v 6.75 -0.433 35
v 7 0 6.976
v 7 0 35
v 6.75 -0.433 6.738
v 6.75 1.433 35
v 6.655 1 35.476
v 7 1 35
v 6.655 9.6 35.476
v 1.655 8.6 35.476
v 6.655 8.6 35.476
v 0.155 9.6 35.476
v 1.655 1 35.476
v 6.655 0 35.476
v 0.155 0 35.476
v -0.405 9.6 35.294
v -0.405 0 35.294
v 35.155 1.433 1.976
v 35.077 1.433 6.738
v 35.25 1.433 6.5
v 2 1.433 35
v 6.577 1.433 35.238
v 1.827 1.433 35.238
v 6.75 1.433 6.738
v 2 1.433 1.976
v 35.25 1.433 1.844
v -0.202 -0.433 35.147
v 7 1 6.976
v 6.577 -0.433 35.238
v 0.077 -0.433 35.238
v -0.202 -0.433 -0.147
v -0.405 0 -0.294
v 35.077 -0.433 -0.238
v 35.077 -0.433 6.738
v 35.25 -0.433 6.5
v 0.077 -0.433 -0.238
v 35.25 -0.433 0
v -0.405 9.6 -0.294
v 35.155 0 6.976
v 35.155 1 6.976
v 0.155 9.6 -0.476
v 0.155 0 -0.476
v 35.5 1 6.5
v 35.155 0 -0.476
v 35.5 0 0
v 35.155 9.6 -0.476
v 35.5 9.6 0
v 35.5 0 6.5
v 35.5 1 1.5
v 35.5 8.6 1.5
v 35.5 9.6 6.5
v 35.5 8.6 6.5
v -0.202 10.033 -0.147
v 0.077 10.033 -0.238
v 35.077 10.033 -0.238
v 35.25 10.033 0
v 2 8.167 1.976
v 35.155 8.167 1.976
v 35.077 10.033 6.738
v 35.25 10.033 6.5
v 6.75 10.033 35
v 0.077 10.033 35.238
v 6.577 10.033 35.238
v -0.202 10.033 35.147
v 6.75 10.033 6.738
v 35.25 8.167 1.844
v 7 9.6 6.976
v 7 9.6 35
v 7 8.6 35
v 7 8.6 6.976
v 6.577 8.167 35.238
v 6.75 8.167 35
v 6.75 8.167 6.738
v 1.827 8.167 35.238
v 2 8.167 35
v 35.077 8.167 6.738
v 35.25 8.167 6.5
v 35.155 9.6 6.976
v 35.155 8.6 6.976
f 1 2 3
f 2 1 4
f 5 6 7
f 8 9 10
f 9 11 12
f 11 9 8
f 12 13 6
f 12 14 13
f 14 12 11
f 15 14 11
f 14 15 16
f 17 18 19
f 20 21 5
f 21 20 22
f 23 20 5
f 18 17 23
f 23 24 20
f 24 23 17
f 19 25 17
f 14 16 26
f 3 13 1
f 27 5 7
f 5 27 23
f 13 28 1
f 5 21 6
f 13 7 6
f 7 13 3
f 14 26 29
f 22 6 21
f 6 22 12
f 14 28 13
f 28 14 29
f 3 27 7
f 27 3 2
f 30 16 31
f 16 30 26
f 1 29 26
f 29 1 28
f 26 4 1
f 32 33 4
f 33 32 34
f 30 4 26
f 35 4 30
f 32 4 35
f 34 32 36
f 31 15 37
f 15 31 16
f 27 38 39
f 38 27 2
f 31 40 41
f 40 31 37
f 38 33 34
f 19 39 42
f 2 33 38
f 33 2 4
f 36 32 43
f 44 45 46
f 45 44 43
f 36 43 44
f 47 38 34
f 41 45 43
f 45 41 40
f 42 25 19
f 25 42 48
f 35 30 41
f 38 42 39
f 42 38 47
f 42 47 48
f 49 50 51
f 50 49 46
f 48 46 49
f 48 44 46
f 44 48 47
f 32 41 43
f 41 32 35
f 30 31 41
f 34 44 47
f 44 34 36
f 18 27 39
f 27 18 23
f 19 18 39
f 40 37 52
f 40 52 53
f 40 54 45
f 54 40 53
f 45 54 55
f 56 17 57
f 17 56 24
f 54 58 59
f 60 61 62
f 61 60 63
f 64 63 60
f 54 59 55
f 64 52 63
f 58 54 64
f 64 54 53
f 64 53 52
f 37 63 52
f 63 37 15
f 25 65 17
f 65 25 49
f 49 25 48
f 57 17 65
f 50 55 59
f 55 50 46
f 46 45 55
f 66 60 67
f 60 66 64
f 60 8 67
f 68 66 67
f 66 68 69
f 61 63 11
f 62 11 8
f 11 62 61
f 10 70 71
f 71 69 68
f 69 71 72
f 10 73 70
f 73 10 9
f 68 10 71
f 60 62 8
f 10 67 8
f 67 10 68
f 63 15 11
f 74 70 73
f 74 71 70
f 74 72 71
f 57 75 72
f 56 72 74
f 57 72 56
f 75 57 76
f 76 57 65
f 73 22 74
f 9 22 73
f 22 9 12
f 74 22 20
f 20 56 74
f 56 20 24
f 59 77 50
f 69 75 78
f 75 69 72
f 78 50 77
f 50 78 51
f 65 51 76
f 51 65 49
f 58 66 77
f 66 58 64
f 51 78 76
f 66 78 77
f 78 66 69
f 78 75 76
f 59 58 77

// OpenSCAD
clipWidth = 35;
clipLength = 35;
clipDepth = 5;
clipThickness = 1;
spineThickness = 1.5;
bedThickness = 6.6;
cornerRadius = 0.5;
actualSpaceHeight = bedThickness + 2 * cornerRadius;
totalHeight = 2 * clipThickness + actualSpaceHeight;

translate([0, totalHeight, 0]) {
    rotate([90, 0, 0]) {
        minkowski() {
            color("purple")
                    sphere($fn = 0, $fa = 12, $fs = 2, r = cornerRadius);

            difference() {
                difference() {
                    cube([clipWidth, clipLength, totalHeight]);
                    color("red")
                        translate([spineThickness, spineThickness, clipThickness]) {
                            cube([clipWidth - spineThickness, clipLength - spineThickness, actualSpaceHeight]);
                        }
                }
                offset = spineThickness + clipDepth;
                color("green")
                    translate([offset, offset, 0]) {
                        cube([clipWidth - offset, clipLength - offset, totalHeight]);
                    }
            }
        }
    }
}
